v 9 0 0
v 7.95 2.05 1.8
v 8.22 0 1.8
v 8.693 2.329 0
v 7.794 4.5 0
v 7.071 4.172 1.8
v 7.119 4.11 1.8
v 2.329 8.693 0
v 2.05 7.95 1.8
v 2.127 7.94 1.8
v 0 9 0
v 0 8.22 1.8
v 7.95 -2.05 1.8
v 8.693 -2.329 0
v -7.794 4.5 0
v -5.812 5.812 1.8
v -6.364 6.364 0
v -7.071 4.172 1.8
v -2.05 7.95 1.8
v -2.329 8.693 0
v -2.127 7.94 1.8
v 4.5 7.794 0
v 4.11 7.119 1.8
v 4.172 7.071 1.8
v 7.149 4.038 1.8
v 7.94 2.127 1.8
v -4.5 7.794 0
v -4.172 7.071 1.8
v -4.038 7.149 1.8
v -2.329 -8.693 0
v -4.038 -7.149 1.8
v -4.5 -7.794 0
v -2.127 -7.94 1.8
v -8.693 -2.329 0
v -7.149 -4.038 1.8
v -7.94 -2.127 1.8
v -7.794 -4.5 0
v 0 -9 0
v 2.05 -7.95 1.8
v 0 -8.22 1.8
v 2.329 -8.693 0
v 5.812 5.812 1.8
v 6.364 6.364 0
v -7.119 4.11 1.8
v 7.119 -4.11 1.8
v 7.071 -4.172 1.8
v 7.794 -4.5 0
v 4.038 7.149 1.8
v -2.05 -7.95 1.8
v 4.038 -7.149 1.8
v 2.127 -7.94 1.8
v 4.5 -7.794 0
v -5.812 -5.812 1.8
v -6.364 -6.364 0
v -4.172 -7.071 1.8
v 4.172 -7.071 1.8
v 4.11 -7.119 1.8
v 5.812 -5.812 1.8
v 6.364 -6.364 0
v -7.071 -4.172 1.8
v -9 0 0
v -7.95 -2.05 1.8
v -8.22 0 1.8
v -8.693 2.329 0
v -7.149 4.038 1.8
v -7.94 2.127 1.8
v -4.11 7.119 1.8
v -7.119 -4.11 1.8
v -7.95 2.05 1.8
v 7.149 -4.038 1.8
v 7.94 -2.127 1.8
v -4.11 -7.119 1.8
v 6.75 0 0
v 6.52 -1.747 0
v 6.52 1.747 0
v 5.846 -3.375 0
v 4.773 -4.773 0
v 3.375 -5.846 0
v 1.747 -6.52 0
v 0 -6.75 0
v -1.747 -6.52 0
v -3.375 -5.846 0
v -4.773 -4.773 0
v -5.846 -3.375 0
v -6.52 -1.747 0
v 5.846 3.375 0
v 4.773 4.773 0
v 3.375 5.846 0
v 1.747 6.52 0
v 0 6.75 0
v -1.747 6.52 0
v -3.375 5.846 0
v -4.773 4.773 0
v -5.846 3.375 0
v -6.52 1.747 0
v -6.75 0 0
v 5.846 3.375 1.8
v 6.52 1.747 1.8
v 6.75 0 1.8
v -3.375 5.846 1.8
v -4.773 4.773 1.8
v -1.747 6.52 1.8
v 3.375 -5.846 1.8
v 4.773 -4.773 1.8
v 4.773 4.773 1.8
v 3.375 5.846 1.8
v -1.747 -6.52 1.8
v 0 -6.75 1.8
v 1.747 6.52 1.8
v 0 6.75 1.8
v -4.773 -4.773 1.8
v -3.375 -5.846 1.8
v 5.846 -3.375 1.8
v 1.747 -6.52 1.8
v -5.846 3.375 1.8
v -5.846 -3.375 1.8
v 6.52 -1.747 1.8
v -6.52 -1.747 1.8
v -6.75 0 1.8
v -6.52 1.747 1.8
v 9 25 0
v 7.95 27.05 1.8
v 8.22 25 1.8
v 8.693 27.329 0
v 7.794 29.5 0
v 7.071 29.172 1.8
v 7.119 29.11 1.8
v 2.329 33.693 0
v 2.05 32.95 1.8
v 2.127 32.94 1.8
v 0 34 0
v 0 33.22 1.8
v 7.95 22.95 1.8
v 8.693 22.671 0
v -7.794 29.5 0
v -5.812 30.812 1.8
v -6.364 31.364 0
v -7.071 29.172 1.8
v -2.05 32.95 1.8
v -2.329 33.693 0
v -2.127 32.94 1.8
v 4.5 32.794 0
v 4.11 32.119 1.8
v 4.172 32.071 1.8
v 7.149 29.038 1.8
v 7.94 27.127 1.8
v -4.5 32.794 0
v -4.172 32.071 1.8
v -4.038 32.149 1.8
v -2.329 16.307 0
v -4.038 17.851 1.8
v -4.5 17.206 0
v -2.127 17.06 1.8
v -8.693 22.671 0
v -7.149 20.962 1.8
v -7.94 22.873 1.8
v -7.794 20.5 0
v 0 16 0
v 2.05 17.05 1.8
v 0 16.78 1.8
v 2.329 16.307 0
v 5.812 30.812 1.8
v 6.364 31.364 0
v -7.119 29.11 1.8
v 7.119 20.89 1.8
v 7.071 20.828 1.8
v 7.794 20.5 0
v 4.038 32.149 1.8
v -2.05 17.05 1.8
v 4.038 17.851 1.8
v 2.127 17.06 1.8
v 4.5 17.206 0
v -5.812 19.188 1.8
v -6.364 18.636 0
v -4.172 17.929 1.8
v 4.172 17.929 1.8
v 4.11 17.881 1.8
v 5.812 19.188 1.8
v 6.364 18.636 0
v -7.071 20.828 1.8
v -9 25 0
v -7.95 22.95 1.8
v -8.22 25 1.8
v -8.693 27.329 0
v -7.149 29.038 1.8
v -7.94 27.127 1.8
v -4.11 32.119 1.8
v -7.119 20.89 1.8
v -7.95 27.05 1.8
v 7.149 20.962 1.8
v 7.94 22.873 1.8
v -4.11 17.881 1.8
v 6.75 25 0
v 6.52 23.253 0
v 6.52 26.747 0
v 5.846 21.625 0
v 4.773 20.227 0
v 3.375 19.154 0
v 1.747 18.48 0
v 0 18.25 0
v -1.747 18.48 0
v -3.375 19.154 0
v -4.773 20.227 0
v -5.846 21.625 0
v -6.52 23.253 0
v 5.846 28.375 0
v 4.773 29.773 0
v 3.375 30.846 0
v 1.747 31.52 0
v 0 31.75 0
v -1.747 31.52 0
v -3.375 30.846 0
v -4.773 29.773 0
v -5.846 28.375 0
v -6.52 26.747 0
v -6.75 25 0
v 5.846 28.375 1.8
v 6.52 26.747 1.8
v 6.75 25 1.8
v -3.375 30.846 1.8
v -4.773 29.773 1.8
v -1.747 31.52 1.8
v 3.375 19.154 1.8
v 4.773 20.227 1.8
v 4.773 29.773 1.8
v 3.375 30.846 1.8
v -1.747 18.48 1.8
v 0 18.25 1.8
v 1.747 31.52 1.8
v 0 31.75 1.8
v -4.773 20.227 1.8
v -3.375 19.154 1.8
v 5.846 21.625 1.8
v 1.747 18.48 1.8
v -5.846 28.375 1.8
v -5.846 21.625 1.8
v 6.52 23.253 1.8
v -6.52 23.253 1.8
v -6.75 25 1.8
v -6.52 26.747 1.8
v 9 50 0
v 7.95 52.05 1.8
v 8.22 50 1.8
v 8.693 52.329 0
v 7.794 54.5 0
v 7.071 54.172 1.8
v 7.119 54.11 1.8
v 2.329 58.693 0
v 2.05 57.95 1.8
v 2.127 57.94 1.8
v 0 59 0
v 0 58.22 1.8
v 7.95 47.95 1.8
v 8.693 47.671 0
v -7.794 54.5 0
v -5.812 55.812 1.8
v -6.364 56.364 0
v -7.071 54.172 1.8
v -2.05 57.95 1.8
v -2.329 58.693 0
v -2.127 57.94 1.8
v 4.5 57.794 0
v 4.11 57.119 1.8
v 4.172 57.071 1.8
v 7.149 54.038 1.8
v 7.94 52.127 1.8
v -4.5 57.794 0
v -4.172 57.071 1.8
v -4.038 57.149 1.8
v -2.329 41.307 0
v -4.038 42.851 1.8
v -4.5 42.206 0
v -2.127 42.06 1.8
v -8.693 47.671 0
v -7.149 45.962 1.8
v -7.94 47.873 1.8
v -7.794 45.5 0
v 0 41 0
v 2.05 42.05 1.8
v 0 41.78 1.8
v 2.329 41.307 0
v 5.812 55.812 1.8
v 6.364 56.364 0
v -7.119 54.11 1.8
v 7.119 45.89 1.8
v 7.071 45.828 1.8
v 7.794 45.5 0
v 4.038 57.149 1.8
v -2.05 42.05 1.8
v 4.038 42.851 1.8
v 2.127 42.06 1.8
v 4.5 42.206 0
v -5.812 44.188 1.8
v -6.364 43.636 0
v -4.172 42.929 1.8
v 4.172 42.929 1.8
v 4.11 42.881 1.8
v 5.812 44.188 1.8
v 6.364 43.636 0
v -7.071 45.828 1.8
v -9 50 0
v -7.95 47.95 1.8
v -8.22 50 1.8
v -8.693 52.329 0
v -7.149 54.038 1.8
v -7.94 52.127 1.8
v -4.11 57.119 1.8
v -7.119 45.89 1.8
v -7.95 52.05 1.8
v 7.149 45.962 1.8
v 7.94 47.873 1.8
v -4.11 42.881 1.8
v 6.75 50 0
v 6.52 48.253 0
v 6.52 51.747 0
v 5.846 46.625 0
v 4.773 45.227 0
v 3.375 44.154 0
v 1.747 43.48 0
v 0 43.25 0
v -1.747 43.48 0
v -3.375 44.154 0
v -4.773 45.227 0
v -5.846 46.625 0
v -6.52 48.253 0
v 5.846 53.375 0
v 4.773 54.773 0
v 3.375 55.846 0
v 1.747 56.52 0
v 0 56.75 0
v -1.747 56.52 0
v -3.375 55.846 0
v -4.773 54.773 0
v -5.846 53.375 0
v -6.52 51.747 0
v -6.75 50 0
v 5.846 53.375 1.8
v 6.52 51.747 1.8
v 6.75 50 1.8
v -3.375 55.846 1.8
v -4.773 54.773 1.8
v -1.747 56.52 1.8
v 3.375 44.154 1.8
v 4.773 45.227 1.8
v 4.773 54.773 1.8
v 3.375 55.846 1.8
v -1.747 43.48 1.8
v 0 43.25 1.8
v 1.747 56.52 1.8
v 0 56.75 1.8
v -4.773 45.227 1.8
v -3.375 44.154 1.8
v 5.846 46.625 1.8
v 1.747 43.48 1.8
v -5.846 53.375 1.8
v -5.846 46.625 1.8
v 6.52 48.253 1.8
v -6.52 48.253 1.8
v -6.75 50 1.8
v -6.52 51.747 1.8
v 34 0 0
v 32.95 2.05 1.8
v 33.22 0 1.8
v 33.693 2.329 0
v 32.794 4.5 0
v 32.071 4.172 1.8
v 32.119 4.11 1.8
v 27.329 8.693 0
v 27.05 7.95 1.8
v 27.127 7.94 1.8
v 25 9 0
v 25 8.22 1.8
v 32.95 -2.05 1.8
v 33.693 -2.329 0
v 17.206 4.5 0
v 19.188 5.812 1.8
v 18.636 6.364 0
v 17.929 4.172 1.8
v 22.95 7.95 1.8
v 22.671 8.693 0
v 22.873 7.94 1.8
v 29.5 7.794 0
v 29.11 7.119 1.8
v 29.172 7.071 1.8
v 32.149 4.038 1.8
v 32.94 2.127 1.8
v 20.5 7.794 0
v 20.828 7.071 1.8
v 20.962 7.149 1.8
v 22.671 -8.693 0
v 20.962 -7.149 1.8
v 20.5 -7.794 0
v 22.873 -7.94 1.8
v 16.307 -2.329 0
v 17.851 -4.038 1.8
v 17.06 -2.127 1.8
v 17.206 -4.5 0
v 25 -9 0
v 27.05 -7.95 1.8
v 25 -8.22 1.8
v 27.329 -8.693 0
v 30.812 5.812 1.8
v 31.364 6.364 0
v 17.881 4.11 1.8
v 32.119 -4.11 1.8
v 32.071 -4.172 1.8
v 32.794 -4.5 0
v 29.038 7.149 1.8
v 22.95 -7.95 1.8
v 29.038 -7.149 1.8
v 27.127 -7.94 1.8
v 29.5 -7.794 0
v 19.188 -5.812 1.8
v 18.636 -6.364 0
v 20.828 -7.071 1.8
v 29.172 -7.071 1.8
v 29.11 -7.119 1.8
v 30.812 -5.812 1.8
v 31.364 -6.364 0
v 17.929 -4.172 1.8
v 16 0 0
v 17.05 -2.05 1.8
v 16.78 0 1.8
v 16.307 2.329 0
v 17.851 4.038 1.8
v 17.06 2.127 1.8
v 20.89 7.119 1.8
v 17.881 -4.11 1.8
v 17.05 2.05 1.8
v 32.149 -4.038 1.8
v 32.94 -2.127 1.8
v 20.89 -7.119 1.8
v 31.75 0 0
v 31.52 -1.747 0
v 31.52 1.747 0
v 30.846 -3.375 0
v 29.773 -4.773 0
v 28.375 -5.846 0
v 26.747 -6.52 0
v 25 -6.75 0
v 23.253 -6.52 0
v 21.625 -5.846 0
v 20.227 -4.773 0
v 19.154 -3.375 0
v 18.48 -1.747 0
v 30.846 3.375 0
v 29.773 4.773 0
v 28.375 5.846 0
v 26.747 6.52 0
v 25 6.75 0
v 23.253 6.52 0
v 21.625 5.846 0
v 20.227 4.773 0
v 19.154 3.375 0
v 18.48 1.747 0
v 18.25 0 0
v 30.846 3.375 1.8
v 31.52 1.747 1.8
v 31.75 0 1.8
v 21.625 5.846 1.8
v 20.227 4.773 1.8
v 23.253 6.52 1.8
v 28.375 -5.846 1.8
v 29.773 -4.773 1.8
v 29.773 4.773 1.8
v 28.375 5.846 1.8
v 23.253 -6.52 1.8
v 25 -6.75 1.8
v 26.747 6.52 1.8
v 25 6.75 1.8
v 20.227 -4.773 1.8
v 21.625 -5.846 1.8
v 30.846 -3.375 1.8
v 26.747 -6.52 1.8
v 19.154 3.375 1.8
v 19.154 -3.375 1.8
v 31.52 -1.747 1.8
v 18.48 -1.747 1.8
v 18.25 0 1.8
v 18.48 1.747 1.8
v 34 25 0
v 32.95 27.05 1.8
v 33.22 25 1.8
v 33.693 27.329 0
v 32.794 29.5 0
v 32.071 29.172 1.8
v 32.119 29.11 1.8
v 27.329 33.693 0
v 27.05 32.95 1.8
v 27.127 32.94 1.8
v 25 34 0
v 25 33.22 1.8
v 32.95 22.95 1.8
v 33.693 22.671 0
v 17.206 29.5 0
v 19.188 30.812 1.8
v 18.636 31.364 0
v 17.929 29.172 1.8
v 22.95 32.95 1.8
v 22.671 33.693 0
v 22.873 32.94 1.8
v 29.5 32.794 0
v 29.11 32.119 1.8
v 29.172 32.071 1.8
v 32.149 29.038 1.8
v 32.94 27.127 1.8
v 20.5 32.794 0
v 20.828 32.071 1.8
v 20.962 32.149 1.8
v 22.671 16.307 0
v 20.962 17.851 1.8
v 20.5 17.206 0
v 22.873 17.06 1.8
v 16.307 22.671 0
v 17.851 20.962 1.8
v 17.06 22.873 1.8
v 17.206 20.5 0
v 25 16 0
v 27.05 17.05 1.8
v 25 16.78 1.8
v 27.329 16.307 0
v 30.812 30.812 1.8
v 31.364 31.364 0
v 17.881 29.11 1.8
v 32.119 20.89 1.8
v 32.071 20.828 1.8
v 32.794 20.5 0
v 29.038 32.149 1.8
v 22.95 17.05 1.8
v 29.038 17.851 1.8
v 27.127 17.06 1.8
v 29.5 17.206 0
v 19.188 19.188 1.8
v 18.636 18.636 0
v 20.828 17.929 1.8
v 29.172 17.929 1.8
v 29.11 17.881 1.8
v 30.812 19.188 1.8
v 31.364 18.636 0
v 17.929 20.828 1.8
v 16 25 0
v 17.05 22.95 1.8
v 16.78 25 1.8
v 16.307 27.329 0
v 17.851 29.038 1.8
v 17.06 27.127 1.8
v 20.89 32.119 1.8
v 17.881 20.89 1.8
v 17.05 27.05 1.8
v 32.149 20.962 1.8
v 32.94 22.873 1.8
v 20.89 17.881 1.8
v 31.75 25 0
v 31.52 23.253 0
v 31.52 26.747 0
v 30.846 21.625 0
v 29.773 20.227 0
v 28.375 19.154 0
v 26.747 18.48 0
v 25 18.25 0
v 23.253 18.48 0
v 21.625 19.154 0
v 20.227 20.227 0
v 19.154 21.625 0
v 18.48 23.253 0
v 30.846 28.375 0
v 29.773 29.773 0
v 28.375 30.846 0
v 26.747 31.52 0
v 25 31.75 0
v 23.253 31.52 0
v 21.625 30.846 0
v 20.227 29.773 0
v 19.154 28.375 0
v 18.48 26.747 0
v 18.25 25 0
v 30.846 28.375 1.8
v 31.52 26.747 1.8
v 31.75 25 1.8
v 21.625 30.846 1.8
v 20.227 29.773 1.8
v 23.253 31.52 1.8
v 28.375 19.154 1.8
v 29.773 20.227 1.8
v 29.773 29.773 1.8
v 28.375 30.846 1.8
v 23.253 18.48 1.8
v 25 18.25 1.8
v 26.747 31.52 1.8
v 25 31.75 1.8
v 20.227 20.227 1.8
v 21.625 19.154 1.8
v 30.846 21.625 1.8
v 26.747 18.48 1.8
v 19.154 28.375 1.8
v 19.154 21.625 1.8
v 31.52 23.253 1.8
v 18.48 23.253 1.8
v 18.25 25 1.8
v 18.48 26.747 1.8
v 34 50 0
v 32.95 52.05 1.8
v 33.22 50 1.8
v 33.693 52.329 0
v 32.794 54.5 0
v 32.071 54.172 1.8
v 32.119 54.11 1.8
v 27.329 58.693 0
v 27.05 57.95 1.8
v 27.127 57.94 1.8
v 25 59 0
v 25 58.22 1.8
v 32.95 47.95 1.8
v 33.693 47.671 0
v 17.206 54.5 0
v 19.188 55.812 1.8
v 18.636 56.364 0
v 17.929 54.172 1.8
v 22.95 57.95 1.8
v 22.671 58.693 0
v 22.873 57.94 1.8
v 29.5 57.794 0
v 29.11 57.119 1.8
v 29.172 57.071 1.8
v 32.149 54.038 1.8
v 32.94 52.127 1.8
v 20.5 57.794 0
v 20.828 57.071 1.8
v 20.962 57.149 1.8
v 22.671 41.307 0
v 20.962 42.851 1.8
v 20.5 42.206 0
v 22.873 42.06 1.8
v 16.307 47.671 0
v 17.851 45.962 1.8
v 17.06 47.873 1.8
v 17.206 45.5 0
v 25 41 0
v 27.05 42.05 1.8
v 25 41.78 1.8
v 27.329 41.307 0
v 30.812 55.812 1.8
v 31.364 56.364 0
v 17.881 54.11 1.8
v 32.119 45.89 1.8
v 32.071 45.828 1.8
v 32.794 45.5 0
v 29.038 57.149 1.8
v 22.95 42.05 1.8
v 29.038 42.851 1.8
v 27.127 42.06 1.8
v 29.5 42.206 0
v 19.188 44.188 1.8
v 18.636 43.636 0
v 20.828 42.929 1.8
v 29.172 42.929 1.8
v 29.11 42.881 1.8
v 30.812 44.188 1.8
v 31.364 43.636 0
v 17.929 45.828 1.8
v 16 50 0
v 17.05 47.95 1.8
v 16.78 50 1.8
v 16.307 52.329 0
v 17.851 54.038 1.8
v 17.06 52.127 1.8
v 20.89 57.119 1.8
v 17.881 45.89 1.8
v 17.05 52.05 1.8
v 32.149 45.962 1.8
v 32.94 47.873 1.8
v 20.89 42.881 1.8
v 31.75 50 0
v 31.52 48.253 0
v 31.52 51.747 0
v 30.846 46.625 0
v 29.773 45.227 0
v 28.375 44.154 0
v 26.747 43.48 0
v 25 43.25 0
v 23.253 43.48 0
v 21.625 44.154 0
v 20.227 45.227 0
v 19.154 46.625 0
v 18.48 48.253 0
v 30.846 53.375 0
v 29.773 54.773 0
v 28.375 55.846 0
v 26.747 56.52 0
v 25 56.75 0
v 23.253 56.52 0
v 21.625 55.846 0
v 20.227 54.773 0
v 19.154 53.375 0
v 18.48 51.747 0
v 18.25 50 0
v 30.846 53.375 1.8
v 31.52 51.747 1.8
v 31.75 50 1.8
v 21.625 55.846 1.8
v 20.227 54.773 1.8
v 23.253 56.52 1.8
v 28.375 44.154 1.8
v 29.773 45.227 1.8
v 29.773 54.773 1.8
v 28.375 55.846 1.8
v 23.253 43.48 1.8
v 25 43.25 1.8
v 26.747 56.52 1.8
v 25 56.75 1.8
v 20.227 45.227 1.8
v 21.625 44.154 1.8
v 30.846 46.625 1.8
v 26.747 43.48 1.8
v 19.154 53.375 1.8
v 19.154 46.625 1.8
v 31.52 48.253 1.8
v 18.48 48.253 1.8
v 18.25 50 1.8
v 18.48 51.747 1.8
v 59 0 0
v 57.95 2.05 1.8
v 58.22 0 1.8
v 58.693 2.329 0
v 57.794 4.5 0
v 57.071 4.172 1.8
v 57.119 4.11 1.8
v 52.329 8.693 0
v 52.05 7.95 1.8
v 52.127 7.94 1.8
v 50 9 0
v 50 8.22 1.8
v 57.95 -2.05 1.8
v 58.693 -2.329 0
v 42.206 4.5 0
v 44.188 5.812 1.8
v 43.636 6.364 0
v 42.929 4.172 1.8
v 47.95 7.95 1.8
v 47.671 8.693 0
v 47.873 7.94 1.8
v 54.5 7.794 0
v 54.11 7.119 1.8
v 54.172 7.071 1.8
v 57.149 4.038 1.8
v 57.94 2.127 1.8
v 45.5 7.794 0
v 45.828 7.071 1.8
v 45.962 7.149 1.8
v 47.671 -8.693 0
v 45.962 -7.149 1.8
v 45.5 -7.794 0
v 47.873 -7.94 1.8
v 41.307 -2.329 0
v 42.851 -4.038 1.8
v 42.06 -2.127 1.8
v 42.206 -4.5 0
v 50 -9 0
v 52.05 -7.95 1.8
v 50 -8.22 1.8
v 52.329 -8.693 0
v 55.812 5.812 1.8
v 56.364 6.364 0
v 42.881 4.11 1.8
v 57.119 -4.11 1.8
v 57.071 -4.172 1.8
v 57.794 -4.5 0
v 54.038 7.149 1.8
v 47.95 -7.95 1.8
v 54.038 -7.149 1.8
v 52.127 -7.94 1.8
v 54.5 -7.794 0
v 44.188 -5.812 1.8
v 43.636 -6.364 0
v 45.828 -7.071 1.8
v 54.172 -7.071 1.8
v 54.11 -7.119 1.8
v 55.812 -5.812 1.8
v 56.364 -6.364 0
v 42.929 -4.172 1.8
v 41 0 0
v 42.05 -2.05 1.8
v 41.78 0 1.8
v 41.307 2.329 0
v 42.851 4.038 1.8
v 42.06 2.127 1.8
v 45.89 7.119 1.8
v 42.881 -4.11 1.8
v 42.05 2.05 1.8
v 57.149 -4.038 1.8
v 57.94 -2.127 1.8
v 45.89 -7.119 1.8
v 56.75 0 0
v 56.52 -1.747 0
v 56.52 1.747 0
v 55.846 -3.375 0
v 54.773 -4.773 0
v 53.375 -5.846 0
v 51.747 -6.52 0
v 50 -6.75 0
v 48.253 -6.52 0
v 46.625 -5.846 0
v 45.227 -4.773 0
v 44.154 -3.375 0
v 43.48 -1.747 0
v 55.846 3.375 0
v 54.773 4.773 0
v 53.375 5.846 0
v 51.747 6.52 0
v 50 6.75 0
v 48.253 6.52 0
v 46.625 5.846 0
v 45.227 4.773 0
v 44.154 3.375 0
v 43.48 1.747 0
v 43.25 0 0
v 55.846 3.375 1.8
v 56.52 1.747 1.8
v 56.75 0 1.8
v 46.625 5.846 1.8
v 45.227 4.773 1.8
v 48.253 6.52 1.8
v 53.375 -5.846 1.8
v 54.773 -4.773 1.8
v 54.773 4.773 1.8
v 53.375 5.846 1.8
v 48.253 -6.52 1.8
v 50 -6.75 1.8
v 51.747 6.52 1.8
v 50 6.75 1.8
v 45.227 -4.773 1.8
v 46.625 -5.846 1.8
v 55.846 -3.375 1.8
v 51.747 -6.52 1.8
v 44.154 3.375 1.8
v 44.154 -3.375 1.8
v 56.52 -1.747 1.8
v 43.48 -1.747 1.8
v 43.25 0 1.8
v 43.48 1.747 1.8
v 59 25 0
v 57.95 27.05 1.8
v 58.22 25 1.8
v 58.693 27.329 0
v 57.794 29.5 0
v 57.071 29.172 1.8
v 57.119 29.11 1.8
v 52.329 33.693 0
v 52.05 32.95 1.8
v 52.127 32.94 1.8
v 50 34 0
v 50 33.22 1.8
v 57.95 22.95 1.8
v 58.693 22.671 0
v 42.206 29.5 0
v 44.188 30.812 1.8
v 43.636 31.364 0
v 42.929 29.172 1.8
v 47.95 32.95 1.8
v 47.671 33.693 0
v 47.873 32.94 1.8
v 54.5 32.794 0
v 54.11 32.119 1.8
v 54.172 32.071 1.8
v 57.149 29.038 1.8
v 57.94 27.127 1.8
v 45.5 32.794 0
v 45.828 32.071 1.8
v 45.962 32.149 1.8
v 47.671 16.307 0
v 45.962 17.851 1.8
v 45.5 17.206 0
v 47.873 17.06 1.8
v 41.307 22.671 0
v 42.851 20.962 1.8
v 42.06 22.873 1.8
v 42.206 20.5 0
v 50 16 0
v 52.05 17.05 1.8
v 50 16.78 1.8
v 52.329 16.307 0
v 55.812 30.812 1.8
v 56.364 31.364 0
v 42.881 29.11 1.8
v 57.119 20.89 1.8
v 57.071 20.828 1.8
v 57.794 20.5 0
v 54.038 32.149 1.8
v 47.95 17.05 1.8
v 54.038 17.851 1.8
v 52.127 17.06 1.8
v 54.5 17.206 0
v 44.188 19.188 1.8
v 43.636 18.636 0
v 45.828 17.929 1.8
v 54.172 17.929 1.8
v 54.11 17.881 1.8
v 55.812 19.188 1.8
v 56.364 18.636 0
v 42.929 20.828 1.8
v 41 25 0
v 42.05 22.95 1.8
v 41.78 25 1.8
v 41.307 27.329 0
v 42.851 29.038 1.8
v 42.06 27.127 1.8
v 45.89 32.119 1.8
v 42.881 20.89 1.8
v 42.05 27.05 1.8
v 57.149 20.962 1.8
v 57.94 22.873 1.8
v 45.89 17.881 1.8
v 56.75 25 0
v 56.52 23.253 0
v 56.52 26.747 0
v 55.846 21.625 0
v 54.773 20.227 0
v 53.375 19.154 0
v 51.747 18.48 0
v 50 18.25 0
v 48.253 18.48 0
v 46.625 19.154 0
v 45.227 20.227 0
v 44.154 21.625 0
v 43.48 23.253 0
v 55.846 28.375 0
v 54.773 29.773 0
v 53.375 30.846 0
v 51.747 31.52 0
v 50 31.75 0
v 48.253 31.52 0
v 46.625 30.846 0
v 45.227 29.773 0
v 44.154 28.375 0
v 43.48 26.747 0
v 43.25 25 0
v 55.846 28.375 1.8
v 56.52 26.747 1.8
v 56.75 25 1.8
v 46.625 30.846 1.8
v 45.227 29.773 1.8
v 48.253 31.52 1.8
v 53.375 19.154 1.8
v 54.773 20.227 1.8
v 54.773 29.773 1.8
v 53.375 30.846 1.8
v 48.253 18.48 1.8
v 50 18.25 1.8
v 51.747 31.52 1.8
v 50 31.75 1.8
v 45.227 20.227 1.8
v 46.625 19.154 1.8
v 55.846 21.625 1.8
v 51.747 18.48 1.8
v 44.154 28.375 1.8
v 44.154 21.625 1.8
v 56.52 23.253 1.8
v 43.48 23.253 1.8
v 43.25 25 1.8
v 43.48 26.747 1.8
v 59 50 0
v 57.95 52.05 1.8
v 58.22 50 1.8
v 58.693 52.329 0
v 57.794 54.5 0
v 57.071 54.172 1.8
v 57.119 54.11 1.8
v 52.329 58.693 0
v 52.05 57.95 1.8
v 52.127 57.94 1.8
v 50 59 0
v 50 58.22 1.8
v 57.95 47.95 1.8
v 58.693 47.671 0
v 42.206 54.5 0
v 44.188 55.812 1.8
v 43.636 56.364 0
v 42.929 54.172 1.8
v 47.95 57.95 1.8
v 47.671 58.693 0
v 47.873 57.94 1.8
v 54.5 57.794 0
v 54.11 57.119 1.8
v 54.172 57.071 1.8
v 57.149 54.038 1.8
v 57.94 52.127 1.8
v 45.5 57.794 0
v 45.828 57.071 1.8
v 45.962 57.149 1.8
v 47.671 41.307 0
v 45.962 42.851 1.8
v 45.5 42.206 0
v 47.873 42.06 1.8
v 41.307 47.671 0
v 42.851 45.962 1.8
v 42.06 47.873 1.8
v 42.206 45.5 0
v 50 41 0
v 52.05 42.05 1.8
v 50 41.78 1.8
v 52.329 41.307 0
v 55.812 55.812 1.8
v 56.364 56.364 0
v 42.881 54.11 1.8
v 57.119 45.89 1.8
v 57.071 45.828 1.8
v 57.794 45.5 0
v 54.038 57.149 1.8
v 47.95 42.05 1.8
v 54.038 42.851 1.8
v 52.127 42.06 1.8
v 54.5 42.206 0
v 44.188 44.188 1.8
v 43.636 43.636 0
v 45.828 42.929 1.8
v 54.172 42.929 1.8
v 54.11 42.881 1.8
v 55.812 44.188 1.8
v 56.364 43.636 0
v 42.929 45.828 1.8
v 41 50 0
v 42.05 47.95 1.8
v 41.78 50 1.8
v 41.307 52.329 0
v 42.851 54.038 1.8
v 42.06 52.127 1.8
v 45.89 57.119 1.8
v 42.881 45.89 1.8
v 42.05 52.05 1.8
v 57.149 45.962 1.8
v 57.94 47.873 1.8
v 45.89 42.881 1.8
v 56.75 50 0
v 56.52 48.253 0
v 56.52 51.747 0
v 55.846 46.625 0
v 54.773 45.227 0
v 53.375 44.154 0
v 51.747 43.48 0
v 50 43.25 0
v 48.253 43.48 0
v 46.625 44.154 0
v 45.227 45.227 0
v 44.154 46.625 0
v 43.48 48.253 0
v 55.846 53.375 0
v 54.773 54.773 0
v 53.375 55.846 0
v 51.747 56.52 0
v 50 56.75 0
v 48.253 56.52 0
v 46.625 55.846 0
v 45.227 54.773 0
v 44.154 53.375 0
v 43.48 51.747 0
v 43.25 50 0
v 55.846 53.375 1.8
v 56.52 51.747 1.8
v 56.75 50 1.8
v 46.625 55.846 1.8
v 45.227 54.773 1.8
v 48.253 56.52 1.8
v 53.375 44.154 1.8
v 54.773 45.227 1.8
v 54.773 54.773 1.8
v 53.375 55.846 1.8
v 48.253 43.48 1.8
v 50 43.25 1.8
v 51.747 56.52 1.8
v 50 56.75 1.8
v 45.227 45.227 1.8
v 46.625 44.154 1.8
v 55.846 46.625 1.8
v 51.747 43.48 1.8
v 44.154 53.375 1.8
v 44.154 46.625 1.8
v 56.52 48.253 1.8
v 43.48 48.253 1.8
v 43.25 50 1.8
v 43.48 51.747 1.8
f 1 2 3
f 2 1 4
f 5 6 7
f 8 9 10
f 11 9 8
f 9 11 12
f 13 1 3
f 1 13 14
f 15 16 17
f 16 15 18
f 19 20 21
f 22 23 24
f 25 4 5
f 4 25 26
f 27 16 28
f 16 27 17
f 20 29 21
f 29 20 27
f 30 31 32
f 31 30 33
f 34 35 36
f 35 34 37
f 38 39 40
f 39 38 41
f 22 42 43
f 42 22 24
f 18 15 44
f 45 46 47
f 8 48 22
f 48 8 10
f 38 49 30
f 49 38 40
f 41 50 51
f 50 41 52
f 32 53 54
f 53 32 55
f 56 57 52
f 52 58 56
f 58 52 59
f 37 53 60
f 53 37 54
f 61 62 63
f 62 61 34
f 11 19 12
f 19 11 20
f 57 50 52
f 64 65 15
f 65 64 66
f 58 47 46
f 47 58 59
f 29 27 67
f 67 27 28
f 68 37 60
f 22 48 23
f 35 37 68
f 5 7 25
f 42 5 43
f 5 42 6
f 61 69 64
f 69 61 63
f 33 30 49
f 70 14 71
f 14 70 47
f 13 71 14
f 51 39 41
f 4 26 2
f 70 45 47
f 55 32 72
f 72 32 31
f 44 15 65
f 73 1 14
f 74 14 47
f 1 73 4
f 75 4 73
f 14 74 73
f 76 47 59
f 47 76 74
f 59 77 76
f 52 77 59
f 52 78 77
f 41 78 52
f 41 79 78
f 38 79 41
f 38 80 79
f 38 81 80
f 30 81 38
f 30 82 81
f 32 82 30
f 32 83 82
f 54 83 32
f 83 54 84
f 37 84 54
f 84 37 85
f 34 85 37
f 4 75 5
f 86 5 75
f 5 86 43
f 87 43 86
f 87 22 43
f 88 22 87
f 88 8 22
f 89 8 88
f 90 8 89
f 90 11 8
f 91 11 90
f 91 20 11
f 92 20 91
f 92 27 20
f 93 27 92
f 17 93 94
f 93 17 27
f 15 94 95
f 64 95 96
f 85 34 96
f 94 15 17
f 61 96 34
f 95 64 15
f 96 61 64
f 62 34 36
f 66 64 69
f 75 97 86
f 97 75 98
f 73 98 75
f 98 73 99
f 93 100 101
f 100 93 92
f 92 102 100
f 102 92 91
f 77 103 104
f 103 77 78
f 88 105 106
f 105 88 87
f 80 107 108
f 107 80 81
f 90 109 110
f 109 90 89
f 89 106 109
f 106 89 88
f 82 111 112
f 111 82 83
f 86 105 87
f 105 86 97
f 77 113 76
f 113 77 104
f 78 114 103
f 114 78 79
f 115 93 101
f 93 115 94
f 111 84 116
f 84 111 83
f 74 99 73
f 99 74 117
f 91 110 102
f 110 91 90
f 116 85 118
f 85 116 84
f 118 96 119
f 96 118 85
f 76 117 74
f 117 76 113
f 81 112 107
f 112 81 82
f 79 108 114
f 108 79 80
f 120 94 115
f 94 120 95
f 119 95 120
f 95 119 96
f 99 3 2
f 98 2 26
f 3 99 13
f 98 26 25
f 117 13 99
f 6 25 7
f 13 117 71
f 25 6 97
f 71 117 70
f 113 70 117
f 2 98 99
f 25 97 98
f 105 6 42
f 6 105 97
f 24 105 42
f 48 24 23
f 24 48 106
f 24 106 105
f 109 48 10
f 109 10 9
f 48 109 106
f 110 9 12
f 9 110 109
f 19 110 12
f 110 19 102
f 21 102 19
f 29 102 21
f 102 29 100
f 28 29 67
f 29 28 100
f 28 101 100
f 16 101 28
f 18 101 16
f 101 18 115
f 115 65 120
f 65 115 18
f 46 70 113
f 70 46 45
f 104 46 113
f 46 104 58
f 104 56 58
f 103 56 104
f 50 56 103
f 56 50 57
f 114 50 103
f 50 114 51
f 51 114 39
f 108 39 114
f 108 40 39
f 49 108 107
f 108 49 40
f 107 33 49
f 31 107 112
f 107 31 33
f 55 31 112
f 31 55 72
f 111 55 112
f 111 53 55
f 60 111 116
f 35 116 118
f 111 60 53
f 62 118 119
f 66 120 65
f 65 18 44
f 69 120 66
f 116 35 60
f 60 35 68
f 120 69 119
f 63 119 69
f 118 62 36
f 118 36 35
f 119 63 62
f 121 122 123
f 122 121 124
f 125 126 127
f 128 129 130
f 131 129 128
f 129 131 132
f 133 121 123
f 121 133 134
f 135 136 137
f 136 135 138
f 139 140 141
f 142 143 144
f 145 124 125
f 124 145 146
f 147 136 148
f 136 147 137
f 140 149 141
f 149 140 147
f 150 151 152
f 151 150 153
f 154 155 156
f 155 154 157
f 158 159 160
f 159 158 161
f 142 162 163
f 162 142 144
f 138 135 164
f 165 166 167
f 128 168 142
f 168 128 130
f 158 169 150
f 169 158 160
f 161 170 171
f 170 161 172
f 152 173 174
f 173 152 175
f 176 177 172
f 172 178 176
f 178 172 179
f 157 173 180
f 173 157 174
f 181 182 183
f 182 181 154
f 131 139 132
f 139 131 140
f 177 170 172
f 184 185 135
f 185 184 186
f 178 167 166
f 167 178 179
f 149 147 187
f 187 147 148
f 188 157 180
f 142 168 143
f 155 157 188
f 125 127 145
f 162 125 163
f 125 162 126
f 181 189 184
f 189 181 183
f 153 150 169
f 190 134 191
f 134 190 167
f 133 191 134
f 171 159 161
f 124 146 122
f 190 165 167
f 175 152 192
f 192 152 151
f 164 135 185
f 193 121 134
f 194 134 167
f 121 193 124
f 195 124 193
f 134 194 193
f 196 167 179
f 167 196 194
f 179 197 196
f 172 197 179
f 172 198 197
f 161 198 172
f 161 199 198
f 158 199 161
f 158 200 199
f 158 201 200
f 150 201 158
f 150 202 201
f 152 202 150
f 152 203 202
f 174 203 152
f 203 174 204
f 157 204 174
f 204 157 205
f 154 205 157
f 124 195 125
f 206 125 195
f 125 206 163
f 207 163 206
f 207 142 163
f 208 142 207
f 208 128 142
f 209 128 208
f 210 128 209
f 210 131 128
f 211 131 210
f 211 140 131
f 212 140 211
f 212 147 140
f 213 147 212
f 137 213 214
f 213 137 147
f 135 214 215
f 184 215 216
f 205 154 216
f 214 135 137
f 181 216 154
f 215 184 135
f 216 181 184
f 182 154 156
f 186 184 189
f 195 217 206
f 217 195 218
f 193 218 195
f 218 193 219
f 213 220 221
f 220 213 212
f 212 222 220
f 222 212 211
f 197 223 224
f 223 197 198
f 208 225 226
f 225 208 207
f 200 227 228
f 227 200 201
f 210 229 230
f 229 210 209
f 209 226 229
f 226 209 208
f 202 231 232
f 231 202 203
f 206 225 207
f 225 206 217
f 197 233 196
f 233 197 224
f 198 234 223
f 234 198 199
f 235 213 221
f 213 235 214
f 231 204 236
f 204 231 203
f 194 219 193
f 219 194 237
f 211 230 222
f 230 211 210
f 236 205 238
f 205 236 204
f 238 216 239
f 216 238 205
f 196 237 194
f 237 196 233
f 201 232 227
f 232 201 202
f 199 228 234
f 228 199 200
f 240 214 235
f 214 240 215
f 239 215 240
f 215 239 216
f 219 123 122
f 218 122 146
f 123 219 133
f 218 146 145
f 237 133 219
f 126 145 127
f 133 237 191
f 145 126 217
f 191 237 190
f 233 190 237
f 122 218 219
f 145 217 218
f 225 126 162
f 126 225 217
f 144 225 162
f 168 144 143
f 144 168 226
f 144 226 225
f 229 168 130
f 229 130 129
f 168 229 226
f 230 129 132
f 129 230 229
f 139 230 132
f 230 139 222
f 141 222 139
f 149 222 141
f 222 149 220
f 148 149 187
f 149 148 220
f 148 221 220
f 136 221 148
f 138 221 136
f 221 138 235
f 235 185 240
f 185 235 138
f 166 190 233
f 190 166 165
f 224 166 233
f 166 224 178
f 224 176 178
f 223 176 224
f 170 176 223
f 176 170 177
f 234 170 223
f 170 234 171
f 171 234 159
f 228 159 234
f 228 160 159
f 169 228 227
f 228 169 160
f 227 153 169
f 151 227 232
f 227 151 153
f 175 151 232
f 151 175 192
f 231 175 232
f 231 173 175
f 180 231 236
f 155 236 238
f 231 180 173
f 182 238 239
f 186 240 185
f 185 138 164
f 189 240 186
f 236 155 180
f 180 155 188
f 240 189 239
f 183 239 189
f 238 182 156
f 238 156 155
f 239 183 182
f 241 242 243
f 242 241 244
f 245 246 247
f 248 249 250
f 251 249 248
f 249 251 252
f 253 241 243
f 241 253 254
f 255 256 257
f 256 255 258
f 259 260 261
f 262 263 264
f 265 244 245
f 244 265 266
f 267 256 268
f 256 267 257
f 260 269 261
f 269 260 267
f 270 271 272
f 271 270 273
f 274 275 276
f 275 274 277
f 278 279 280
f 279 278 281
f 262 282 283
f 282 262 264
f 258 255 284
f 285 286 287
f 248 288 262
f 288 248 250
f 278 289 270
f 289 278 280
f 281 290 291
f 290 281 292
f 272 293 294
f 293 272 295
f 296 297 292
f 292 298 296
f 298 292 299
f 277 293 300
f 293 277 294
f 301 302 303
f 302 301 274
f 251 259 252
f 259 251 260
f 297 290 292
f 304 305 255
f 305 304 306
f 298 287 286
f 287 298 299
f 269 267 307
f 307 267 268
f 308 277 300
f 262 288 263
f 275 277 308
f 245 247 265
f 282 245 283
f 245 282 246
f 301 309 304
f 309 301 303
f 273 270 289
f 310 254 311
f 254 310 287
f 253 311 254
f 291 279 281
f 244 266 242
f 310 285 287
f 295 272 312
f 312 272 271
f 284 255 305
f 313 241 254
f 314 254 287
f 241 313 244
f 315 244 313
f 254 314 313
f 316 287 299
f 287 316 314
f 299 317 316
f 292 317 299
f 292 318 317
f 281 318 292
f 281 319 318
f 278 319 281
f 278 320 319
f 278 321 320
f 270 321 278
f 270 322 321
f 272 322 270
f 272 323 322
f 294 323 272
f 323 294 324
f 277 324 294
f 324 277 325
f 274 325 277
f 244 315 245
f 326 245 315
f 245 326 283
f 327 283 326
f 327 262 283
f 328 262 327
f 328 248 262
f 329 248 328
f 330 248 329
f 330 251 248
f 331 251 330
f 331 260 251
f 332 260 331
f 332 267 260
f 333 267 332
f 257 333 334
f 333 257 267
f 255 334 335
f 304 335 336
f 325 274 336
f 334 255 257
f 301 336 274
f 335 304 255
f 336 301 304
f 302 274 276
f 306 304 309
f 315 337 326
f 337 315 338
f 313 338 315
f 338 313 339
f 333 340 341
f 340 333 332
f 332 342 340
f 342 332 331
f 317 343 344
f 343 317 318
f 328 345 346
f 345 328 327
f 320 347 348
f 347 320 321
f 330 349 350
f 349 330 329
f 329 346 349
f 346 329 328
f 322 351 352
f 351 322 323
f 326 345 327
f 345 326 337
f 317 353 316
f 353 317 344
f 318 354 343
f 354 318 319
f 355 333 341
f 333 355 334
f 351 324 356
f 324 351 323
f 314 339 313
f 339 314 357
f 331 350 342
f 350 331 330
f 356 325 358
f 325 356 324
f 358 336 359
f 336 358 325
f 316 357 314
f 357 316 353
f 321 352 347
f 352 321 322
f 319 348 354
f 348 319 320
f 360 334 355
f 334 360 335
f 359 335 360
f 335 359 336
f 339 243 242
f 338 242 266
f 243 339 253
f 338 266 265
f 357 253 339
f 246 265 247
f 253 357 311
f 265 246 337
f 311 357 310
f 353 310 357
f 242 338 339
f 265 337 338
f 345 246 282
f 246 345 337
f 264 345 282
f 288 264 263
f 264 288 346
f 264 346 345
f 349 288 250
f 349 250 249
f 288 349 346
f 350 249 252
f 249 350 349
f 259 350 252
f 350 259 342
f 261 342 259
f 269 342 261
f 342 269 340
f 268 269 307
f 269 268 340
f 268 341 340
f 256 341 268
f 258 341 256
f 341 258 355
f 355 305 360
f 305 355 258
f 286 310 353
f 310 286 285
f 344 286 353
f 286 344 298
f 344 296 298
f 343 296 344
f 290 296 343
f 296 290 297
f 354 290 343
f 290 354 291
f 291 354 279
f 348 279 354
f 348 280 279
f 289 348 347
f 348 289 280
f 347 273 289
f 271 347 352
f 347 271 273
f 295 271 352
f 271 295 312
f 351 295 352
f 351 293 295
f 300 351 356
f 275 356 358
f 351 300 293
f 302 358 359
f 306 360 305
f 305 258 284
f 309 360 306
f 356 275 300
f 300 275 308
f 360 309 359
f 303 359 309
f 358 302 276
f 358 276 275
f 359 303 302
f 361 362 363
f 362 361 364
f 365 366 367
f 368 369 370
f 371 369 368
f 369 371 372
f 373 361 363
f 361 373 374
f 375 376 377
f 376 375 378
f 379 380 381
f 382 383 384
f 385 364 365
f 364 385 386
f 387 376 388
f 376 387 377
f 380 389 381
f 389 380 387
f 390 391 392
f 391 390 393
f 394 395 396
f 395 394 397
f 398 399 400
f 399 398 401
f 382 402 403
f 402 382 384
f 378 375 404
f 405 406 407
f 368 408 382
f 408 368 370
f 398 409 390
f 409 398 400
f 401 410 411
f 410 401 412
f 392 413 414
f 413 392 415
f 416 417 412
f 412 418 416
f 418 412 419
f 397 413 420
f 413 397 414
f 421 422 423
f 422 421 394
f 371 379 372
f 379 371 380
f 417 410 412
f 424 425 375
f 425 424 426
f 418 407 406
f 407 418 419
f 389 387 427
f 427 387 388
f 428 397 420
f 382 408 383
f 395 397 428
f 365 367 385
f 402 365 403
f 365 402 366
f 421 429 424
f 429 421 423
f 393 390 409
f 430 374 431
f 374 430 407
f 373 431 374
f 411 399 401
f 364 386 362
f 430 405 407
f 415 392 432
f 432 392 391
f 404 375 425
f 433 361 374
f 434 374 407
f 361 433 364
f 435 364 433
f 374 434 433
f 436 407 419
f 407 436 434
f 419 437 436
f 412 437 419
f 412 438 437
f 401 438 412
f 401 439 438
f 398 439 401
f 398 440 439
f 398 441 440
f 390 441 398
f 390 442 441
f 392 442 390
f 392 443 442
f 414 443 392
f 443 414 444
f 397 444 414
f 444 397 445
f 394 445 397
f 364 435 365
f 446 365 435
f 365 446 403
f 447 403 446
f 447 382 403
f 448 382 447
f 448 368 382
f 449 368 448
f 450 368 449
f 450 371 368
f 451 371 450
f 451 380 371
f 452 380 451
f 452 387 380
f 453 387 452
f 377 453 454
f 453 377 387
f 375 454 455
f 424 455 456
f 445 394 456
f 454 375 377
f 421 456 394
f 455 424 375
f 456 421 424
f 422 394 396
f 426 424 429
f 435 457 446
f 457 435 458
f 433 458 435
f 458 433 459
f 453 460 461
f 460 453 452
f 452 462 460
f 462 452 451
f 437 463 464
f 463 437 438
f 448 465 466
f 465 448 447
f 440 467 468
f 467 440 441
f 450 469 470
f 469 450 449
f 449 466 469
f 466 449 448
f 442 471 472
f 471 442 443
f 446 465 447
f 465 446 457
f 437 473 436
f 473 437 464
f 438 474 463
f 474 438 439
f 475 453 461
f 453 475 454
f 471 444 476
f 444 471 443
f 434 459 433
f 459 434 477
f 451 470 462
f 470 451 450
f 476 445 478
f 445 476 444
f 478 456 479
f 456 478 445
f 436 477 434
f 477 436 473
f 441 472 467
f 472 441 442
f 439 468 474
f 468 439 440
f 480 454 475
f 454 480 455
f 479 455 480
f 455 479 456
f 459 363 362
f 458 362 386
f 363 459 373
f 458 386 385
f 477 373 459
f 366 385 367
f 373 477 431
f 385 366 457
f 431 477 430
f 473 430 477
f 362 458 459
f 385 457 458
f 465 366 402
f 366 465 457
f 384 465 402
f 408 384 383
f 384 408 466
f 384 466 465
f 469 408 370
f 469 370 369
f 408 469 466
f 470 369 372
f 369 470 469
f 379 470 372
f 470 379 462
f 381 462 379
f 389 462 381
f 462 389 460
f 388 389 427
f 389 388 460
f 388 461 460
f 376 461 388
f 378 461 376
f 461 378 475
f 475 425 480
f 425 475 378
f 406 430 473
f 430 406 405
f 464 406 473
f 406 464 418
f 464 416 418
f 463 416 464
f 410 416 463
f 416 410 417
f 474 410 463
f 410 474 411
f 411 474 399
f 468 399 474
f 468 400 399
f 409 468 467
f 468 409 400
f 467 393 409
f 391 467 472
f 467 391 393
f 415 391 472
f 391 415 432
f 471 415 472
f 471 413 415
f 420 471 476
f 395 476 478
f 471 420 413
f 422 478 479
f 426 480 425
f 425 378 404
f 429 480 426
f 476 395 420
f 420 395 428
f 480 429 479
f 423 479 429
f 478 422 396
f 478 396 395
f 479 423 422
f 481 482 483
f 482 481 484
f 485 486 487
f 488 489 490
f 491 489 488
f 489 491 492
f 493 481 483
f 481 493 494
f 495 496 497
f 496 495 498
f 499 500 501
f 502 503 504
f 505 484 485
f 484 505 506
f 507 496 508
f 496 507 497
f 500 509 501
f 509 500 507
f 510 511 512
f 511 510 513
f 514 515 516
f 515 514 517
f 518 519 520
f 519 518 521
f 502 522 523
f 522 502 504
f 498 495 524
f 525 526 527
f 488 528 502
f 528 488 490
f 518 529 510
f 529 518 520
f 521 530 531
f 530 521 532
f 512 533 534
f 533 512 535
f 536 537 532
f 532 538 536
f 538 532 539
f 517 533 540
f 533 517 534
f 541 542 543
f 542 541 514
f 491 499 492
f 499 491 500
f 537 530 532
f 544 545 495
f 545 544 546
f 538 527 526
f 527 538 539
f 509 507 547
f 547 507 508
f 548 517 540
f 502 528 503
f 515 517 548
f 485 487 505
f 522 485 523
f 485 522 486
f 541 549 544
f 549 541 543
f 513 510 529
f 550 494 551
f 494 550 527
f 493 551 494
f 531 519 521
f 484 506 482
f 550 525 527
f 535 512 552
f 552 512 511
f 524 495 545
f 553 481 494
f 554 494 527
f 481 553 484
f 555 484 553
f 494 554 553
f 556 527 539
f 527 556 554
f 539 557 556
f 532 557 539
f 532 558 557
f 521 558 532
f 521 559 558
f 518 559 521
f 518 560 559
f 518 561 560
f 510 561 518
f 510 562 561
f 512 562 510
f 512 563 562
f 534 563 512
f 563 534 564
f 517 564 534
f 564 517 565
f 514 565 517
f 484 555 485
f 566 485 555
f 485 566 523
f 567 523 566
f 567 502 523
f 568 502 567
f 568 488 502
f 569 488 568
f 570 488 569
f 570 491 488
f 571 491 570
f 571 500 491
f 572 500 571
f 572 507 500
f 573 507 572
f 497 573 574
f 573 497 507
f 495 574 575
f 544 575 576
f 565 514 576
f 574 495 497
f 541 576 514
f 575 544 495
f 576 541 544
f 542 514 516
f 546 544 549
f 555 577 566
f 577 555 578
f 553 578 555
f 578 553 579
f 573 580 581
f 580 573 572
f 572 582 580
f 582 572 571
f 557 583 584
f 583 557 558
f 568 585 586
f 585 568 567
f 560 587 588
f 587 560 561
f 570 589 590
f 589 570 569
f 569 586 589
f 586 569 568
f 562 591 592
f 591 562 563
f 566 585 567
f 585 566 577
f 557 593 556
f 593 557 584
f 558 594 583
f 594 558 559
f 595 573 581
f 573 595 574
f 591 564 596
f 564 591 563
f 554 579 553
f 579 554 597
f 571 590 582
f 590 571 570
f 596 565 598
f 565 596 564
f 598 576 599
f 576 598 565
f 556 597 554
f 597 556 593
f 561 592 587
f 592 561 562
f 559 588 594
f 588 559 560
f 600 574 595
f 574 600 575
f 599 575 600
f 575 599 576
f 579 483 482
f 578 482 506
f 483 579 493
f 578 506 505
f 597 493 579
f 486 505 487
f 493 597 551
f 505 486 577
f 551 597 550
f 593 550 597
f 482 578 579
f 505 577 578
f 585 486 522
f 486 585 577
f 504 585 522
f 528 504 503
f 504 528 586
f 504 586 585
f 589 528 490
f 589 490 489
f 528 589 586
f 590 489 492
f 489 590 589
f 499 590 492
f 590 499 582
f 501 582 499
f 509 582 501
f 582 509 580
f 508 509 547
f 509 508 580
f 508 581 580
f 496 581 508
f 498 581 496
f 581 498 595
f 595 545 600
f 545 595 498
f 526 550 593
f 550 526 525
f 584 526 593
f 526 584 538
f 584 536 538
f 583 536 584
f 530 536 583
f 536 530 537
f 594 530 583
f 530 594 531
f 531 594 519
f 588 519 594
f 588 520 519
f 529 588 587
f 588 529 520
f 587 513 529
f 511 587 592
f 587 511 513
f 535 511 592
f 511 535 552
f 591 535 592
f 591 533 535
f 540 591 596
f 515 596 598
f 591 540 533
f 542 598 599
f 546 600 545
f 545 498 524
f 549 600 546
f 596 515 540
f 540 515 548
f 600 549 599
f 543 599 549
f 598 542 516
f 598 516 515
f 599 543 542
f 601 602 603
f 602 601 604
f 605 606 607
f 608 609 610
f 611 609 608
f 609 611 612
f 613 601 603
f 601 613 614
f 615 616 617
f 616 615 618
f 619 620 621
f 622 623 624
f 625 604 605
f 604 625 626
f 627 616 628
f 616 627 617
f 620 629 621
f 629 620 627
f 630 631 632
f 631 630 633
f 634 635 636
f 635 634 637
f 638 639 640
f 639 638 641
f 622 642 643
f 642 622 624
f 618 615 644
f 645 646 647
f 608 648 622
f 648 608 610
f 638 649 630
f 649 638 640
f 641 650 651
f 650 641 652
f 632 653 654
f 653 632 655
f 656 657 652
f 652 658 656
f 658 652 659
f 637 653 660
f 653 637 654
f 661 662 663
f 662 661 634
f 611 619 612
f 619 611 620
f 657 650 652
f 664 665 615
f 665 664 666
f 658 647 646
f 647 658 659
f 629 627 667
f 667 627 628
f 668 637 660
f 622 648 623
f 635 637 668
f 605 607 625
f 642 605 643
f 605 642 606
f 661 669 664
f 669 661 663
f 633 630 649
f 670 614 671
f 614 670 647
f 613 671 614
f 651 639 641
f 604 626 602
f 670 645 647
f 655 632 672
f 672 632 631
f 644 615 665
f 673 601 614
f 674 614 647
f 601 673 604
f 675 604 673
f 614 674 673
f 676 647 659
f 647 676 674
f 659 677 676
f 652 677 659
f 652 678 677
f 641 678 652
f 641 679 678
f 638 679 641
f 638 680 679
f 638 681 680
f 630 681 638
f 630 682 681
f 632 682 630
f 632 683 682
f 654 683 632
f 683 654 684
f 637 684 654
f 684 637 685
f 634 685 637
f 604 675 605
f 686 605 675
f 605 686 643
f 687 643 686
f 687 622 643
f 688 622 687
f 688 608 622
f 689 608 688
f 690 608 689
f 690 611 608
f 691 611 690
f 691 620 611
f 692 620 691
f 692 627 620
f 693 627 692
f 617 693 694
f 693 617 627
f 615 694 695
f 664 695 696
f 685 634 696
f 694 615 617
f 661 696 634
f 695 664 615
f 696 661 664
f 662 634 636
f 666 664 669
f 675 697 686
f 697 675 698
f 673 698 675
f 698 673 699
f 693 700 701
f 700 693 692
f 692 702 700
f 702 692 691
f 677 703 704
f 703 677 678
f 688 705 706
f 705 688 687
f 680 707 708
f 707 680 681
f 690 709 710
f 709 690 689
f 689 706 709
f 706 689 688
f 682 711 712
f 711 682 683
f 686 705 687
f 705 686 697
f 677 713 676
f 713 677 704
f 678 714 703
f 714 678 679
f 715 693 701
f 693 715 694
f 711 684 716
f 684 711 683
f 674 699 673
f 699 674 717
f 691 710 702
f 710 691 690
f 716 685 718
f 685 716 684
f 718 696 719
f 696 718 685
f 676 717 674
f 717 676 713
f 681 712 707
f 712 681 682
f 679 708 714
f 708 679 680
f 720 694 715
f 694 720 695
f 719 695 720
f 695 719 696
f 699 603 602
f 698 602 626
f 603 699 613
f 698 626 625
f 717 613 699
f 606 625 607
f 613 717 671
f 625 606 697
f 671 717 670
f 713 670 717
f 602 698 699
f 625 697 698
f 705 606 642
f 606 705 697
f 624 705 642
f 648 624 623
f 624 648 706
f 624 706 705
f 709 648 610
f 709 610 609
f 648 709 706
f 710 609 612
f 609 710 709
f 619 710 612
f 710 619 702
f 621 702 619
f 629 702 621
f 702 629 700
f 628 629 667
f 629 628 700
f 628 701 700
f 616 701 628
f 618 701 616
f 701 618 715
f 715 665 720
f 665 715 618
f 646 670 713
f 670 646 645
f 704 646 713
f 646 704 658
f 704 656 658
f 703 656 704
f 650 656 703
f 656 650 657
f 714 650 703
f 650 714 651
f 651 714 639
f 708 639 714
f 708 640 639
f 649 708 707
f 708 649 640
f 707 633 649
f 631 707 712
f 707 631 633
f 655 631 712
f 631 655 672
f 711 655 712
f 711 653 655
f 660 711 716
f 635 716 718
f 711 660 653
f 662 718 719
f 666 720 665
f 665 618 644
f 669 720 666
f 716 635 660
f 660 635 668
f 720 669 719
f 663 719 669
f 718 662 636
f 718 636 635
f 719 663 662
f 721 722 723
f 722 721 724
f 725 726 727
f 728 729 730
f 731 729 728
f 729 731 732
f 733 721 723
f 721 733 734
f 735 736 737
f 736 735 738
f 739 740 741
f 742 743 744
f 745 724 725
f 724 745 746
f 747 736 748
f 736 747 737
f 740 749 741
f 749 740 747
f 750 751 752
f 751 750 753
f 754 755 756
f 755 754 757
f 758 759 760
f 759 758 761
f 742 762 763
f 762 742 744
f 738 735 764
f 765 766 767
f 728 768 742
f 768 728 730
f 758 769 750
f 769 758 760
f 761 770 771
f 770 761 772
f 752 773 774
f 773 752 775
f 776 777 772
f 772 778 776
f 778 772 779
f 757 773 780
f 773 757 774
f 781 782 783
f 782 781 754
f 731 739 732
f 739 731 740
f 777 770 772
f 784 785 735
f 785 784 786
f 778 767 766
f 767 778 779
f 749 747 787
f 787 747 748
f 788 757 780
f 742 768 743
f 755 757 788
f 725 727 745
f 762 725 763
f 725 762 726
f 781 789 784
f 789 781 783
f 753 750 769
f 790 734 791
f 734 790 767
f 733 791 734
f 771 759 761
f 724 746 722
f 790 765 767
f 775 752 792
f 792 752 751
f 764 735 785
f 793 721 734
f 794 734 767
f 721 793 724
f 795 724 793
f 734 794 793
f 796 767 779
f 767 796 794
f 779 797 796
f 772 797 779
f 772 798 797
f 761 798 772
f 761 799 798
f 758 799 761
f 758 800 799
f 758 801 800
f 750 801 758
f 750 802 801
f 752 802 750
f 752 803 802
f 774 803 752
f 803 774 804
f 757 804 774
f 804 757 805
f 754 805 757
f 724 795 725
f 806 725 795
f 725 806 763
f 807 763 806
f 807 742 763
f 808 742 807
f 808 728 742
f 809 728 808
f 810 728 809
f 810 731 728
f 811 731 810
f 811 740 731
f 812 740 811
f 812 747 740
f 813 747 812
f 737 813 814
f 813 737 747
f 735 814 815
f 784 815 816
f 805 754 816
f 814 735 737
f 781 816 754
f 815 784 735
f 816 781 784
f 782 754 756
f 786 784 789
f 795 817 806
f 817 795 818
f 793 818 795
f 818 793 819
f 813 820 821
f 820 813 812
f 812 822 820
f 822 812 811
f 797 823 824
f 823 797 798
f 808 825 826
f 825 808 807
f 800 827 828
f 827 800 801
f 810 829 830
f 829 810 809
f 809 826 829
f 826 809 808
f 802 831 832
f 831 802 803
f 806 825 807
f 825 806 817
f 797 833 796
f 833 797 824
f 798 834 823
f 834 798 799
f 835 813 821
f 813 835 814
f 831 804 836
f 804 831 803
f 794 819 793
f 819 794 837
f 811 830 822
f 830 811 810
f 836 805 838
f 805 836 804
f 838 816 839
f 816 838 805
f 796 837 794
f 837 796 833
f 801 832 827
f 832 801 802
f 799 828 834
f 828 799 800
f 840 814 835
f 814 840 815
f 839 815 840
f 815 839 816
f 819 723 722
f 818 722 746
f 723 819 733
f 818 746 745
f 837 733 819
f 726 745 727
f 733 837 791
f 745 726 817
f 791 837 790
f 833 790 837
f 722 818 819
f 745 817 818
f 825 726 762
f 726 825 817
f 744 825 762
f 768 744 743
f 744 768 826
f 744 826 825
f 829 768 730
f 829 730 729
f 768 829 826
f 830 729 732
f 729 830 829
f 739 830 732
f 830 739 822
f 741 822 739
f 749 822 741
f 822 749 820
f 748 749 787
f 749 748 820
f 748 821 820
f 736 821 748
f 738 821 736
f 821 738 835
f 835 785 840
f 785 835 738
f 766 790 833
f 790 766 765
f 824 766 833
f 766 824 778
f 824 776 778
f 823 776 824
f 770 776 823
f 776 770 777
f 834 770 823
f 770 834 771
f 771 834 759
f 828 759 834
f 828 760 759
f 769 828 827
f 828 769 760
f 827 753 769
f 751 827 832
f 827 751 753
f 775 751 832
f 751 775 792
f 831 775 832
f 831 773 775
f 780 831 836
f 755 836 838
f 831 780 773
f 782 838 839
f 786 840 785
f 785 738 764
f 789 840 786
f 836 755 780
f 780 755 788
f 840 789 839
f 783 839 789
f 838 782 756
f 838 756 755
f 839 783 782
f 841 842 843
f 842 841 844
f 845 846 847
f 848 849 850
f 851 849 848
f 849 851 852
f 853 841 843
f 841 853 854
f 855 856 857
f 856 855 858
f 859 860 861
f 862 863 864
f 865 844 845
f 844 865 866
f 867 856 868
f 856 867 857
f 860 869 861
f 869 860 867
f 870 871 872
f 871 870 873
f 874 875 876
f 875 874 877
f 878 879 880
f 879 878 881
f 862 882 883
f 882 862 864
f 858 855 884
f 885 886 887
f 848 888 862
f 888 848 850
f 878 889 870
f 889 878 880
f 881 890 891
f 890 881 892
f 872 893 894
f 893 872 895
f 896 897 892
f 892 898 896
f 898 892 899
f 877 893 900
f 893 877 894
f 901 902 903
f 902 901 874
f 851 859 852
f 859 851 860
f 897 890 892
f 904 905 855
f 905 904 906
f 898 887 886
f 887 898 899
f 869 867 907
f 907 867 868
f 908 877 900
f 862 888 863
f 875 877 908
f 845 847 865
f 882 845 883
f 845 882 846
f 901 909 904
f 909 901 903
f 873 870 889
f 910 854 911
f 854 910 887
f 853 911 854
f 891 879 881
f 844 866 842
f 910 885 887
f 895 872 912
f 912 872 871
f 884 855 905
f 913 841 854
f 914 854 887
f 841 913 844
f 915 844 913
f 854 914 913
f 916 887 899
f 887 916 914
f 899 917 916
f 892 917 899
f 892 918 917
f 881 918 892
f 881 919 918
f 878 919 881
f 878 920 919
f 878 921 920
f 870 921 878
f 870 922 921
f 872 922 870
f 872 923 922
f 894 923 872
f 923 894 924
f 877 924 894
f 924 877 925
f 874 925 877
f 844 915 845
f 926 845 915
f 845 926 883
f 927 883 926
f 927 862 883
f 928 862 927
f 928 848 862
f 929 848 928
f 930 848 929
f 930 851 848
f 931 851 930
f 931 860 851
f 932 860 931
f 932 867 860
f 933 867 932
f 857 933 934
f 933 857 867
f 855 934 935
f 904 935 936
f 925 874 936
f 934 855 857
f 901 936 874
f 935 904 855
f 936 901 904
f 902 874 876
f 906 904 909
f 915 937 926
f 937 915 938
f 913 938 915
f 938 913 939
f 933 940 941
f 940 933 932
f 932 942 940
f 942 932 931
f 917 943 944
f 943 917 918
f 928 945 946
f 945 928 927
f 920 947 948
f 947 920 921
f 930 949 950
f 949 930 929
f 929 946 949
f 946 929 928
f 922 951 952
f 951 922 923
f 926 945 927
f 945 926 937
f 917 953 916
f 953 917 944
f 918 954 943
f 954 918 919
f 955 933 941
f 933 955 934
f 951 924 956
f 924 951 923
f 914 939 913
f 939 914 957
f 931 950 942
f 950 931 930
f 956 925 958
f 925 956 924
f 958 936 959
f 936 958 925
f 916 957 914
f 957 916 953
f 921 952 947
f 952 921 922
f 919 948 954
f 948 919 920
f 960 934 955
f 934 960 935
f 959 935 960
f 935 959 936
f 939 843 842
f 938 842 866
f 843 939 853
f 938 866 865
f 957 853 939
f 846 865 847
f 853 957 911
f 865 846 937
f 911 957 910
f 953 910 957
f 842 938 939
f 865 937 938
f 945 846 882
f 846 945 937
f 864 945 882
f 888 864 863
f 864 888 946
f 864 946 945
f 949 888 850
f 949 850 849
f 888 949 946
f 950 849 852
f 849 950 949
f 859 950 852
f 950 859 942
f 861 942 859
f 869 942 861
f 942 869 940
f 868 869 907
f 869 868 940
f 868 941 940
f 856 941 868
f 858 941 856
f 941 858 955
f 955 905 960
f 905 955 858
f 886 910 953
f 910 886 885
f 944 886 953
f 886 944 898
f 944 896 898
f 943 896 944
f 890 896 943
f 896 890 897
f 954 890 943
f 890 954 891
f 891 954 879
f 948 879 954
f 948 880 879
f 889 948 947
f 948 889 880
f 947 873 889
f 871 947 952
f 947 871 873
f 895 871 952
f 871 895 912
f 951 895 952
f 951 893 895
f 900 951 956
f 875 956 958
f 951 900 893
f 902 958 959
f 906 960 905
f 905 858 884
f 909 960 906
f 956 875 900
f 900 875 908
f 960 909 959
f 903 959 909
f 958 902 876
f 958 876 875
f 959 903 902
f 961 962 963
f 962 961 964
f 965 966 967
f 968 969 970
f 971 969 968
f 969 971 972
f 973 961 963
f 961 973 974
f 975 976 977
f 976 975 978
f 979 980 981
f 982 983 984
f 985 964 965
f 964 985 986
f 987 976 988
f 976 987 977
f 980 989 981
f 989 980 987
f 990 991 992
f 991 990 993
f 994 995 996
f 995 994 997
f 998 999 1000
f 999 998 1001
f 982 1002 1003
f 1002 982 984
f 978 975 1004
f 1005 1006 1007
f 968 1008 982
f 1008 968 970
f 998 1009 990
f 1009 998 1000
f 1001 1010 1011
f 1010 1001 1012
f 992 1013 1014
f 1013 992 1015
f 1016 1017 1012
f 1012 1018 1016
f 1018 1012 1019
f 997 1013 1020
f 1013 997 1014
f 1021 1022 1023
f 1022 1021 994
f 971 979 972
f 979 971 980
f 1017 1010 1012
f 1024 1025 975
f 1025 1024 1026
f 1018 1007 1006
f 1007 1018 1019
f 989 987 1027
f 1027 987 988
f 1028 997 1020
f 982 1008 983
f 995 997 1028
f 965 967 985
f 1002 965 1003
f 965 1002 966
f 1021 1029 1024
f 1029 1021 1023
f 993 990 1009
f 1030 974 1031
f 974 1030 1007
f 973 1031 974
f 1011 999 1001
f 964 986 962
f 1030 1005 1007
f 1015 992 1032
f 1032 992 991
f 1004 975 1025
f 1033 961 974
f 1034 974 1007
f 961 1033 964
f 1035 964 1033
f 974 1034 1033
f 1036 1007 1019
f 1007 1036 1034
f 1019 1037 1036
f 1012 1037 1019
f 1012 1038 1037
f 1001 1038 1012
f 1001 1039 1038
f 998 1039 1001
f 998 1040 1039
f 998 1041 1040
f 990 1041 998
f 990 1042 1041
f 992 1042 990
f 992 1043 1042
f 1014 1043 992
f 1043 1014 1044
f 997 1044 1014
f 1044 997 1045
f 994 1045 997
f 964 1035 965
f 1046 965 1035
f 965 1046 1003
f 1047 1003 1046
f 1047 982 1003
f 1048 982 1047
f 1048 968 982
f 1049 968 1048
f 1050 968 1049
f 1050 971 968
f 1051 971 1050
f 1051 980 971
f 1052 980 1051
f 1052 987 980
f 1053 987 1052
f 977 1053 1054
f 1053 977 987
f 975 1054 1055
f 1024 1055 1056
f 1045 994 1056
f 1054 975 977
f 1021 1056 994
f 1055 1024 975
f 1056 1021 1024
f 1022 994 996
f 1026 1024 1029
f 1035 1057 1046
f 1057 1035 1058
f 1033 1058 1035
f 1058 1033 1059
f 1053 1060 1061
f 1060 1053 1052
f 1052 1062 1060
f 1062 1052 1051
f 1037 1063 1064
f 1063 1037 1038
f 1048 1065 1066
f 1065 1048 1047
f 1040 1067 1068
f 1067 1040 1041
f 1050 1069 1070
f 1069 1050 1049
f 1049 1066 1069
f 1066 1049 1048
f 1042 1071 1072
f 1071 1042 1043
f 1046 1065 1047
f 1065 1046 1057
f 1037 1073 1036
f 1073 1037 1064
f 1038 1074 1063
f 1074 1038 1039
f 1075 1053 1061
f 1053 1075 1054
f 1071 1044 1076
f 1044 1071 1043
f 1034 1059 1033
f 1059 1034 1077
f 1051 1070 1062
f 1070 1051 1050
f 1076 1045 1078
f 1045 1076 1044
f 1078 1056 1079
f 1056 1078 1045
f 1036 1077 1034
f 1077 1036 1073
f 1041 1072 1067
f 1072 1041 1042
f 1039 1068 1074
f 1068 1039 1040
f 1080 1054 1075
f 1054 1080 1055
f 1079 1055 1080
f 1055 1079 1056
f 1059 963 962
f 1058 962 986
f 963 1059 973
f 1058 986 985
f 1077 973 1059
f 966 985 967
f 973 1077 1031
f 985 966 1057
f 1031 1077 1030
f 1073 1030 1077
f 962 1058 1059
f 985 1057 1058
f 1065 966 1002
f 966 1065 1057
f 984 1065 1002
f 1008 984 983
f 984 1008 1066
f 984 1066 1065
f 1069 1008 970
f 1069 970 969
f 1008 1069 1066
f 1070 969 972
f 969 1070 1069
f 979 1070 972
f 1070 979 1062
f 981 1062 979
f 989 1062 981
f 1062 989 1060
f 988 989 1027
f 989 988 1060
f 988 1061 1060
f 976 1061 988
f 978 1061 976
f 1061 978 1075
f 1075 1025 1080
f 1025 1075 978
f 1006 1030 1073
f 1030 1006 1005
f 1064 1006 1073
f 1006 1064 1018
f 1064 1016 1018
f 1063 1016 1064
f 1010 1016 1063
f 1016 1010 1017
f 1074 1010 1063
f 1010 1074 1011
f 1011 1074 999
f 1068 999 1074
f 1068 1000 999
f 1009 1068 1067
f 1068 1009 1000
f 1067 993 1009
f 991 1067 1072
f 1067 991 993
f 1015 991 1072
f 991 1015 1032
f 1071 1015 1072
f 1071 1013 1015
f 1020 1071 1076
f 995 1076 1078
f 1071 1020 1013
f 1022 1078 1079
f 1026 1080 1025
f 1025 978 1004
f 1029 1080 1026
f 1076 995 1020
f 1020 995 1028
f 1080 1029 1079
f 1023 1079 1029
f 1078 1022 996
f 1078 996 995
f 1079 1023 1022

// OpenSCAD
module geeetech_rostock_g2_pulley_guide()
{
    difference() {
        cylinder(d1=18, d2=5, h=15, $fn=24);
        translate([0,0,-0.1]) cylinder(d=13.5, h=15.2, $fn=24);
        translate([-9, -9, 1.8]) cube([18, 18, 10]);
    }
}

if (true) {
    for (x = [0:2] )
        for (y = [0:2]) 
            translate([x*25, y*25, 0]) geeetech_rostock_g2_pulley_guide();
    
}
